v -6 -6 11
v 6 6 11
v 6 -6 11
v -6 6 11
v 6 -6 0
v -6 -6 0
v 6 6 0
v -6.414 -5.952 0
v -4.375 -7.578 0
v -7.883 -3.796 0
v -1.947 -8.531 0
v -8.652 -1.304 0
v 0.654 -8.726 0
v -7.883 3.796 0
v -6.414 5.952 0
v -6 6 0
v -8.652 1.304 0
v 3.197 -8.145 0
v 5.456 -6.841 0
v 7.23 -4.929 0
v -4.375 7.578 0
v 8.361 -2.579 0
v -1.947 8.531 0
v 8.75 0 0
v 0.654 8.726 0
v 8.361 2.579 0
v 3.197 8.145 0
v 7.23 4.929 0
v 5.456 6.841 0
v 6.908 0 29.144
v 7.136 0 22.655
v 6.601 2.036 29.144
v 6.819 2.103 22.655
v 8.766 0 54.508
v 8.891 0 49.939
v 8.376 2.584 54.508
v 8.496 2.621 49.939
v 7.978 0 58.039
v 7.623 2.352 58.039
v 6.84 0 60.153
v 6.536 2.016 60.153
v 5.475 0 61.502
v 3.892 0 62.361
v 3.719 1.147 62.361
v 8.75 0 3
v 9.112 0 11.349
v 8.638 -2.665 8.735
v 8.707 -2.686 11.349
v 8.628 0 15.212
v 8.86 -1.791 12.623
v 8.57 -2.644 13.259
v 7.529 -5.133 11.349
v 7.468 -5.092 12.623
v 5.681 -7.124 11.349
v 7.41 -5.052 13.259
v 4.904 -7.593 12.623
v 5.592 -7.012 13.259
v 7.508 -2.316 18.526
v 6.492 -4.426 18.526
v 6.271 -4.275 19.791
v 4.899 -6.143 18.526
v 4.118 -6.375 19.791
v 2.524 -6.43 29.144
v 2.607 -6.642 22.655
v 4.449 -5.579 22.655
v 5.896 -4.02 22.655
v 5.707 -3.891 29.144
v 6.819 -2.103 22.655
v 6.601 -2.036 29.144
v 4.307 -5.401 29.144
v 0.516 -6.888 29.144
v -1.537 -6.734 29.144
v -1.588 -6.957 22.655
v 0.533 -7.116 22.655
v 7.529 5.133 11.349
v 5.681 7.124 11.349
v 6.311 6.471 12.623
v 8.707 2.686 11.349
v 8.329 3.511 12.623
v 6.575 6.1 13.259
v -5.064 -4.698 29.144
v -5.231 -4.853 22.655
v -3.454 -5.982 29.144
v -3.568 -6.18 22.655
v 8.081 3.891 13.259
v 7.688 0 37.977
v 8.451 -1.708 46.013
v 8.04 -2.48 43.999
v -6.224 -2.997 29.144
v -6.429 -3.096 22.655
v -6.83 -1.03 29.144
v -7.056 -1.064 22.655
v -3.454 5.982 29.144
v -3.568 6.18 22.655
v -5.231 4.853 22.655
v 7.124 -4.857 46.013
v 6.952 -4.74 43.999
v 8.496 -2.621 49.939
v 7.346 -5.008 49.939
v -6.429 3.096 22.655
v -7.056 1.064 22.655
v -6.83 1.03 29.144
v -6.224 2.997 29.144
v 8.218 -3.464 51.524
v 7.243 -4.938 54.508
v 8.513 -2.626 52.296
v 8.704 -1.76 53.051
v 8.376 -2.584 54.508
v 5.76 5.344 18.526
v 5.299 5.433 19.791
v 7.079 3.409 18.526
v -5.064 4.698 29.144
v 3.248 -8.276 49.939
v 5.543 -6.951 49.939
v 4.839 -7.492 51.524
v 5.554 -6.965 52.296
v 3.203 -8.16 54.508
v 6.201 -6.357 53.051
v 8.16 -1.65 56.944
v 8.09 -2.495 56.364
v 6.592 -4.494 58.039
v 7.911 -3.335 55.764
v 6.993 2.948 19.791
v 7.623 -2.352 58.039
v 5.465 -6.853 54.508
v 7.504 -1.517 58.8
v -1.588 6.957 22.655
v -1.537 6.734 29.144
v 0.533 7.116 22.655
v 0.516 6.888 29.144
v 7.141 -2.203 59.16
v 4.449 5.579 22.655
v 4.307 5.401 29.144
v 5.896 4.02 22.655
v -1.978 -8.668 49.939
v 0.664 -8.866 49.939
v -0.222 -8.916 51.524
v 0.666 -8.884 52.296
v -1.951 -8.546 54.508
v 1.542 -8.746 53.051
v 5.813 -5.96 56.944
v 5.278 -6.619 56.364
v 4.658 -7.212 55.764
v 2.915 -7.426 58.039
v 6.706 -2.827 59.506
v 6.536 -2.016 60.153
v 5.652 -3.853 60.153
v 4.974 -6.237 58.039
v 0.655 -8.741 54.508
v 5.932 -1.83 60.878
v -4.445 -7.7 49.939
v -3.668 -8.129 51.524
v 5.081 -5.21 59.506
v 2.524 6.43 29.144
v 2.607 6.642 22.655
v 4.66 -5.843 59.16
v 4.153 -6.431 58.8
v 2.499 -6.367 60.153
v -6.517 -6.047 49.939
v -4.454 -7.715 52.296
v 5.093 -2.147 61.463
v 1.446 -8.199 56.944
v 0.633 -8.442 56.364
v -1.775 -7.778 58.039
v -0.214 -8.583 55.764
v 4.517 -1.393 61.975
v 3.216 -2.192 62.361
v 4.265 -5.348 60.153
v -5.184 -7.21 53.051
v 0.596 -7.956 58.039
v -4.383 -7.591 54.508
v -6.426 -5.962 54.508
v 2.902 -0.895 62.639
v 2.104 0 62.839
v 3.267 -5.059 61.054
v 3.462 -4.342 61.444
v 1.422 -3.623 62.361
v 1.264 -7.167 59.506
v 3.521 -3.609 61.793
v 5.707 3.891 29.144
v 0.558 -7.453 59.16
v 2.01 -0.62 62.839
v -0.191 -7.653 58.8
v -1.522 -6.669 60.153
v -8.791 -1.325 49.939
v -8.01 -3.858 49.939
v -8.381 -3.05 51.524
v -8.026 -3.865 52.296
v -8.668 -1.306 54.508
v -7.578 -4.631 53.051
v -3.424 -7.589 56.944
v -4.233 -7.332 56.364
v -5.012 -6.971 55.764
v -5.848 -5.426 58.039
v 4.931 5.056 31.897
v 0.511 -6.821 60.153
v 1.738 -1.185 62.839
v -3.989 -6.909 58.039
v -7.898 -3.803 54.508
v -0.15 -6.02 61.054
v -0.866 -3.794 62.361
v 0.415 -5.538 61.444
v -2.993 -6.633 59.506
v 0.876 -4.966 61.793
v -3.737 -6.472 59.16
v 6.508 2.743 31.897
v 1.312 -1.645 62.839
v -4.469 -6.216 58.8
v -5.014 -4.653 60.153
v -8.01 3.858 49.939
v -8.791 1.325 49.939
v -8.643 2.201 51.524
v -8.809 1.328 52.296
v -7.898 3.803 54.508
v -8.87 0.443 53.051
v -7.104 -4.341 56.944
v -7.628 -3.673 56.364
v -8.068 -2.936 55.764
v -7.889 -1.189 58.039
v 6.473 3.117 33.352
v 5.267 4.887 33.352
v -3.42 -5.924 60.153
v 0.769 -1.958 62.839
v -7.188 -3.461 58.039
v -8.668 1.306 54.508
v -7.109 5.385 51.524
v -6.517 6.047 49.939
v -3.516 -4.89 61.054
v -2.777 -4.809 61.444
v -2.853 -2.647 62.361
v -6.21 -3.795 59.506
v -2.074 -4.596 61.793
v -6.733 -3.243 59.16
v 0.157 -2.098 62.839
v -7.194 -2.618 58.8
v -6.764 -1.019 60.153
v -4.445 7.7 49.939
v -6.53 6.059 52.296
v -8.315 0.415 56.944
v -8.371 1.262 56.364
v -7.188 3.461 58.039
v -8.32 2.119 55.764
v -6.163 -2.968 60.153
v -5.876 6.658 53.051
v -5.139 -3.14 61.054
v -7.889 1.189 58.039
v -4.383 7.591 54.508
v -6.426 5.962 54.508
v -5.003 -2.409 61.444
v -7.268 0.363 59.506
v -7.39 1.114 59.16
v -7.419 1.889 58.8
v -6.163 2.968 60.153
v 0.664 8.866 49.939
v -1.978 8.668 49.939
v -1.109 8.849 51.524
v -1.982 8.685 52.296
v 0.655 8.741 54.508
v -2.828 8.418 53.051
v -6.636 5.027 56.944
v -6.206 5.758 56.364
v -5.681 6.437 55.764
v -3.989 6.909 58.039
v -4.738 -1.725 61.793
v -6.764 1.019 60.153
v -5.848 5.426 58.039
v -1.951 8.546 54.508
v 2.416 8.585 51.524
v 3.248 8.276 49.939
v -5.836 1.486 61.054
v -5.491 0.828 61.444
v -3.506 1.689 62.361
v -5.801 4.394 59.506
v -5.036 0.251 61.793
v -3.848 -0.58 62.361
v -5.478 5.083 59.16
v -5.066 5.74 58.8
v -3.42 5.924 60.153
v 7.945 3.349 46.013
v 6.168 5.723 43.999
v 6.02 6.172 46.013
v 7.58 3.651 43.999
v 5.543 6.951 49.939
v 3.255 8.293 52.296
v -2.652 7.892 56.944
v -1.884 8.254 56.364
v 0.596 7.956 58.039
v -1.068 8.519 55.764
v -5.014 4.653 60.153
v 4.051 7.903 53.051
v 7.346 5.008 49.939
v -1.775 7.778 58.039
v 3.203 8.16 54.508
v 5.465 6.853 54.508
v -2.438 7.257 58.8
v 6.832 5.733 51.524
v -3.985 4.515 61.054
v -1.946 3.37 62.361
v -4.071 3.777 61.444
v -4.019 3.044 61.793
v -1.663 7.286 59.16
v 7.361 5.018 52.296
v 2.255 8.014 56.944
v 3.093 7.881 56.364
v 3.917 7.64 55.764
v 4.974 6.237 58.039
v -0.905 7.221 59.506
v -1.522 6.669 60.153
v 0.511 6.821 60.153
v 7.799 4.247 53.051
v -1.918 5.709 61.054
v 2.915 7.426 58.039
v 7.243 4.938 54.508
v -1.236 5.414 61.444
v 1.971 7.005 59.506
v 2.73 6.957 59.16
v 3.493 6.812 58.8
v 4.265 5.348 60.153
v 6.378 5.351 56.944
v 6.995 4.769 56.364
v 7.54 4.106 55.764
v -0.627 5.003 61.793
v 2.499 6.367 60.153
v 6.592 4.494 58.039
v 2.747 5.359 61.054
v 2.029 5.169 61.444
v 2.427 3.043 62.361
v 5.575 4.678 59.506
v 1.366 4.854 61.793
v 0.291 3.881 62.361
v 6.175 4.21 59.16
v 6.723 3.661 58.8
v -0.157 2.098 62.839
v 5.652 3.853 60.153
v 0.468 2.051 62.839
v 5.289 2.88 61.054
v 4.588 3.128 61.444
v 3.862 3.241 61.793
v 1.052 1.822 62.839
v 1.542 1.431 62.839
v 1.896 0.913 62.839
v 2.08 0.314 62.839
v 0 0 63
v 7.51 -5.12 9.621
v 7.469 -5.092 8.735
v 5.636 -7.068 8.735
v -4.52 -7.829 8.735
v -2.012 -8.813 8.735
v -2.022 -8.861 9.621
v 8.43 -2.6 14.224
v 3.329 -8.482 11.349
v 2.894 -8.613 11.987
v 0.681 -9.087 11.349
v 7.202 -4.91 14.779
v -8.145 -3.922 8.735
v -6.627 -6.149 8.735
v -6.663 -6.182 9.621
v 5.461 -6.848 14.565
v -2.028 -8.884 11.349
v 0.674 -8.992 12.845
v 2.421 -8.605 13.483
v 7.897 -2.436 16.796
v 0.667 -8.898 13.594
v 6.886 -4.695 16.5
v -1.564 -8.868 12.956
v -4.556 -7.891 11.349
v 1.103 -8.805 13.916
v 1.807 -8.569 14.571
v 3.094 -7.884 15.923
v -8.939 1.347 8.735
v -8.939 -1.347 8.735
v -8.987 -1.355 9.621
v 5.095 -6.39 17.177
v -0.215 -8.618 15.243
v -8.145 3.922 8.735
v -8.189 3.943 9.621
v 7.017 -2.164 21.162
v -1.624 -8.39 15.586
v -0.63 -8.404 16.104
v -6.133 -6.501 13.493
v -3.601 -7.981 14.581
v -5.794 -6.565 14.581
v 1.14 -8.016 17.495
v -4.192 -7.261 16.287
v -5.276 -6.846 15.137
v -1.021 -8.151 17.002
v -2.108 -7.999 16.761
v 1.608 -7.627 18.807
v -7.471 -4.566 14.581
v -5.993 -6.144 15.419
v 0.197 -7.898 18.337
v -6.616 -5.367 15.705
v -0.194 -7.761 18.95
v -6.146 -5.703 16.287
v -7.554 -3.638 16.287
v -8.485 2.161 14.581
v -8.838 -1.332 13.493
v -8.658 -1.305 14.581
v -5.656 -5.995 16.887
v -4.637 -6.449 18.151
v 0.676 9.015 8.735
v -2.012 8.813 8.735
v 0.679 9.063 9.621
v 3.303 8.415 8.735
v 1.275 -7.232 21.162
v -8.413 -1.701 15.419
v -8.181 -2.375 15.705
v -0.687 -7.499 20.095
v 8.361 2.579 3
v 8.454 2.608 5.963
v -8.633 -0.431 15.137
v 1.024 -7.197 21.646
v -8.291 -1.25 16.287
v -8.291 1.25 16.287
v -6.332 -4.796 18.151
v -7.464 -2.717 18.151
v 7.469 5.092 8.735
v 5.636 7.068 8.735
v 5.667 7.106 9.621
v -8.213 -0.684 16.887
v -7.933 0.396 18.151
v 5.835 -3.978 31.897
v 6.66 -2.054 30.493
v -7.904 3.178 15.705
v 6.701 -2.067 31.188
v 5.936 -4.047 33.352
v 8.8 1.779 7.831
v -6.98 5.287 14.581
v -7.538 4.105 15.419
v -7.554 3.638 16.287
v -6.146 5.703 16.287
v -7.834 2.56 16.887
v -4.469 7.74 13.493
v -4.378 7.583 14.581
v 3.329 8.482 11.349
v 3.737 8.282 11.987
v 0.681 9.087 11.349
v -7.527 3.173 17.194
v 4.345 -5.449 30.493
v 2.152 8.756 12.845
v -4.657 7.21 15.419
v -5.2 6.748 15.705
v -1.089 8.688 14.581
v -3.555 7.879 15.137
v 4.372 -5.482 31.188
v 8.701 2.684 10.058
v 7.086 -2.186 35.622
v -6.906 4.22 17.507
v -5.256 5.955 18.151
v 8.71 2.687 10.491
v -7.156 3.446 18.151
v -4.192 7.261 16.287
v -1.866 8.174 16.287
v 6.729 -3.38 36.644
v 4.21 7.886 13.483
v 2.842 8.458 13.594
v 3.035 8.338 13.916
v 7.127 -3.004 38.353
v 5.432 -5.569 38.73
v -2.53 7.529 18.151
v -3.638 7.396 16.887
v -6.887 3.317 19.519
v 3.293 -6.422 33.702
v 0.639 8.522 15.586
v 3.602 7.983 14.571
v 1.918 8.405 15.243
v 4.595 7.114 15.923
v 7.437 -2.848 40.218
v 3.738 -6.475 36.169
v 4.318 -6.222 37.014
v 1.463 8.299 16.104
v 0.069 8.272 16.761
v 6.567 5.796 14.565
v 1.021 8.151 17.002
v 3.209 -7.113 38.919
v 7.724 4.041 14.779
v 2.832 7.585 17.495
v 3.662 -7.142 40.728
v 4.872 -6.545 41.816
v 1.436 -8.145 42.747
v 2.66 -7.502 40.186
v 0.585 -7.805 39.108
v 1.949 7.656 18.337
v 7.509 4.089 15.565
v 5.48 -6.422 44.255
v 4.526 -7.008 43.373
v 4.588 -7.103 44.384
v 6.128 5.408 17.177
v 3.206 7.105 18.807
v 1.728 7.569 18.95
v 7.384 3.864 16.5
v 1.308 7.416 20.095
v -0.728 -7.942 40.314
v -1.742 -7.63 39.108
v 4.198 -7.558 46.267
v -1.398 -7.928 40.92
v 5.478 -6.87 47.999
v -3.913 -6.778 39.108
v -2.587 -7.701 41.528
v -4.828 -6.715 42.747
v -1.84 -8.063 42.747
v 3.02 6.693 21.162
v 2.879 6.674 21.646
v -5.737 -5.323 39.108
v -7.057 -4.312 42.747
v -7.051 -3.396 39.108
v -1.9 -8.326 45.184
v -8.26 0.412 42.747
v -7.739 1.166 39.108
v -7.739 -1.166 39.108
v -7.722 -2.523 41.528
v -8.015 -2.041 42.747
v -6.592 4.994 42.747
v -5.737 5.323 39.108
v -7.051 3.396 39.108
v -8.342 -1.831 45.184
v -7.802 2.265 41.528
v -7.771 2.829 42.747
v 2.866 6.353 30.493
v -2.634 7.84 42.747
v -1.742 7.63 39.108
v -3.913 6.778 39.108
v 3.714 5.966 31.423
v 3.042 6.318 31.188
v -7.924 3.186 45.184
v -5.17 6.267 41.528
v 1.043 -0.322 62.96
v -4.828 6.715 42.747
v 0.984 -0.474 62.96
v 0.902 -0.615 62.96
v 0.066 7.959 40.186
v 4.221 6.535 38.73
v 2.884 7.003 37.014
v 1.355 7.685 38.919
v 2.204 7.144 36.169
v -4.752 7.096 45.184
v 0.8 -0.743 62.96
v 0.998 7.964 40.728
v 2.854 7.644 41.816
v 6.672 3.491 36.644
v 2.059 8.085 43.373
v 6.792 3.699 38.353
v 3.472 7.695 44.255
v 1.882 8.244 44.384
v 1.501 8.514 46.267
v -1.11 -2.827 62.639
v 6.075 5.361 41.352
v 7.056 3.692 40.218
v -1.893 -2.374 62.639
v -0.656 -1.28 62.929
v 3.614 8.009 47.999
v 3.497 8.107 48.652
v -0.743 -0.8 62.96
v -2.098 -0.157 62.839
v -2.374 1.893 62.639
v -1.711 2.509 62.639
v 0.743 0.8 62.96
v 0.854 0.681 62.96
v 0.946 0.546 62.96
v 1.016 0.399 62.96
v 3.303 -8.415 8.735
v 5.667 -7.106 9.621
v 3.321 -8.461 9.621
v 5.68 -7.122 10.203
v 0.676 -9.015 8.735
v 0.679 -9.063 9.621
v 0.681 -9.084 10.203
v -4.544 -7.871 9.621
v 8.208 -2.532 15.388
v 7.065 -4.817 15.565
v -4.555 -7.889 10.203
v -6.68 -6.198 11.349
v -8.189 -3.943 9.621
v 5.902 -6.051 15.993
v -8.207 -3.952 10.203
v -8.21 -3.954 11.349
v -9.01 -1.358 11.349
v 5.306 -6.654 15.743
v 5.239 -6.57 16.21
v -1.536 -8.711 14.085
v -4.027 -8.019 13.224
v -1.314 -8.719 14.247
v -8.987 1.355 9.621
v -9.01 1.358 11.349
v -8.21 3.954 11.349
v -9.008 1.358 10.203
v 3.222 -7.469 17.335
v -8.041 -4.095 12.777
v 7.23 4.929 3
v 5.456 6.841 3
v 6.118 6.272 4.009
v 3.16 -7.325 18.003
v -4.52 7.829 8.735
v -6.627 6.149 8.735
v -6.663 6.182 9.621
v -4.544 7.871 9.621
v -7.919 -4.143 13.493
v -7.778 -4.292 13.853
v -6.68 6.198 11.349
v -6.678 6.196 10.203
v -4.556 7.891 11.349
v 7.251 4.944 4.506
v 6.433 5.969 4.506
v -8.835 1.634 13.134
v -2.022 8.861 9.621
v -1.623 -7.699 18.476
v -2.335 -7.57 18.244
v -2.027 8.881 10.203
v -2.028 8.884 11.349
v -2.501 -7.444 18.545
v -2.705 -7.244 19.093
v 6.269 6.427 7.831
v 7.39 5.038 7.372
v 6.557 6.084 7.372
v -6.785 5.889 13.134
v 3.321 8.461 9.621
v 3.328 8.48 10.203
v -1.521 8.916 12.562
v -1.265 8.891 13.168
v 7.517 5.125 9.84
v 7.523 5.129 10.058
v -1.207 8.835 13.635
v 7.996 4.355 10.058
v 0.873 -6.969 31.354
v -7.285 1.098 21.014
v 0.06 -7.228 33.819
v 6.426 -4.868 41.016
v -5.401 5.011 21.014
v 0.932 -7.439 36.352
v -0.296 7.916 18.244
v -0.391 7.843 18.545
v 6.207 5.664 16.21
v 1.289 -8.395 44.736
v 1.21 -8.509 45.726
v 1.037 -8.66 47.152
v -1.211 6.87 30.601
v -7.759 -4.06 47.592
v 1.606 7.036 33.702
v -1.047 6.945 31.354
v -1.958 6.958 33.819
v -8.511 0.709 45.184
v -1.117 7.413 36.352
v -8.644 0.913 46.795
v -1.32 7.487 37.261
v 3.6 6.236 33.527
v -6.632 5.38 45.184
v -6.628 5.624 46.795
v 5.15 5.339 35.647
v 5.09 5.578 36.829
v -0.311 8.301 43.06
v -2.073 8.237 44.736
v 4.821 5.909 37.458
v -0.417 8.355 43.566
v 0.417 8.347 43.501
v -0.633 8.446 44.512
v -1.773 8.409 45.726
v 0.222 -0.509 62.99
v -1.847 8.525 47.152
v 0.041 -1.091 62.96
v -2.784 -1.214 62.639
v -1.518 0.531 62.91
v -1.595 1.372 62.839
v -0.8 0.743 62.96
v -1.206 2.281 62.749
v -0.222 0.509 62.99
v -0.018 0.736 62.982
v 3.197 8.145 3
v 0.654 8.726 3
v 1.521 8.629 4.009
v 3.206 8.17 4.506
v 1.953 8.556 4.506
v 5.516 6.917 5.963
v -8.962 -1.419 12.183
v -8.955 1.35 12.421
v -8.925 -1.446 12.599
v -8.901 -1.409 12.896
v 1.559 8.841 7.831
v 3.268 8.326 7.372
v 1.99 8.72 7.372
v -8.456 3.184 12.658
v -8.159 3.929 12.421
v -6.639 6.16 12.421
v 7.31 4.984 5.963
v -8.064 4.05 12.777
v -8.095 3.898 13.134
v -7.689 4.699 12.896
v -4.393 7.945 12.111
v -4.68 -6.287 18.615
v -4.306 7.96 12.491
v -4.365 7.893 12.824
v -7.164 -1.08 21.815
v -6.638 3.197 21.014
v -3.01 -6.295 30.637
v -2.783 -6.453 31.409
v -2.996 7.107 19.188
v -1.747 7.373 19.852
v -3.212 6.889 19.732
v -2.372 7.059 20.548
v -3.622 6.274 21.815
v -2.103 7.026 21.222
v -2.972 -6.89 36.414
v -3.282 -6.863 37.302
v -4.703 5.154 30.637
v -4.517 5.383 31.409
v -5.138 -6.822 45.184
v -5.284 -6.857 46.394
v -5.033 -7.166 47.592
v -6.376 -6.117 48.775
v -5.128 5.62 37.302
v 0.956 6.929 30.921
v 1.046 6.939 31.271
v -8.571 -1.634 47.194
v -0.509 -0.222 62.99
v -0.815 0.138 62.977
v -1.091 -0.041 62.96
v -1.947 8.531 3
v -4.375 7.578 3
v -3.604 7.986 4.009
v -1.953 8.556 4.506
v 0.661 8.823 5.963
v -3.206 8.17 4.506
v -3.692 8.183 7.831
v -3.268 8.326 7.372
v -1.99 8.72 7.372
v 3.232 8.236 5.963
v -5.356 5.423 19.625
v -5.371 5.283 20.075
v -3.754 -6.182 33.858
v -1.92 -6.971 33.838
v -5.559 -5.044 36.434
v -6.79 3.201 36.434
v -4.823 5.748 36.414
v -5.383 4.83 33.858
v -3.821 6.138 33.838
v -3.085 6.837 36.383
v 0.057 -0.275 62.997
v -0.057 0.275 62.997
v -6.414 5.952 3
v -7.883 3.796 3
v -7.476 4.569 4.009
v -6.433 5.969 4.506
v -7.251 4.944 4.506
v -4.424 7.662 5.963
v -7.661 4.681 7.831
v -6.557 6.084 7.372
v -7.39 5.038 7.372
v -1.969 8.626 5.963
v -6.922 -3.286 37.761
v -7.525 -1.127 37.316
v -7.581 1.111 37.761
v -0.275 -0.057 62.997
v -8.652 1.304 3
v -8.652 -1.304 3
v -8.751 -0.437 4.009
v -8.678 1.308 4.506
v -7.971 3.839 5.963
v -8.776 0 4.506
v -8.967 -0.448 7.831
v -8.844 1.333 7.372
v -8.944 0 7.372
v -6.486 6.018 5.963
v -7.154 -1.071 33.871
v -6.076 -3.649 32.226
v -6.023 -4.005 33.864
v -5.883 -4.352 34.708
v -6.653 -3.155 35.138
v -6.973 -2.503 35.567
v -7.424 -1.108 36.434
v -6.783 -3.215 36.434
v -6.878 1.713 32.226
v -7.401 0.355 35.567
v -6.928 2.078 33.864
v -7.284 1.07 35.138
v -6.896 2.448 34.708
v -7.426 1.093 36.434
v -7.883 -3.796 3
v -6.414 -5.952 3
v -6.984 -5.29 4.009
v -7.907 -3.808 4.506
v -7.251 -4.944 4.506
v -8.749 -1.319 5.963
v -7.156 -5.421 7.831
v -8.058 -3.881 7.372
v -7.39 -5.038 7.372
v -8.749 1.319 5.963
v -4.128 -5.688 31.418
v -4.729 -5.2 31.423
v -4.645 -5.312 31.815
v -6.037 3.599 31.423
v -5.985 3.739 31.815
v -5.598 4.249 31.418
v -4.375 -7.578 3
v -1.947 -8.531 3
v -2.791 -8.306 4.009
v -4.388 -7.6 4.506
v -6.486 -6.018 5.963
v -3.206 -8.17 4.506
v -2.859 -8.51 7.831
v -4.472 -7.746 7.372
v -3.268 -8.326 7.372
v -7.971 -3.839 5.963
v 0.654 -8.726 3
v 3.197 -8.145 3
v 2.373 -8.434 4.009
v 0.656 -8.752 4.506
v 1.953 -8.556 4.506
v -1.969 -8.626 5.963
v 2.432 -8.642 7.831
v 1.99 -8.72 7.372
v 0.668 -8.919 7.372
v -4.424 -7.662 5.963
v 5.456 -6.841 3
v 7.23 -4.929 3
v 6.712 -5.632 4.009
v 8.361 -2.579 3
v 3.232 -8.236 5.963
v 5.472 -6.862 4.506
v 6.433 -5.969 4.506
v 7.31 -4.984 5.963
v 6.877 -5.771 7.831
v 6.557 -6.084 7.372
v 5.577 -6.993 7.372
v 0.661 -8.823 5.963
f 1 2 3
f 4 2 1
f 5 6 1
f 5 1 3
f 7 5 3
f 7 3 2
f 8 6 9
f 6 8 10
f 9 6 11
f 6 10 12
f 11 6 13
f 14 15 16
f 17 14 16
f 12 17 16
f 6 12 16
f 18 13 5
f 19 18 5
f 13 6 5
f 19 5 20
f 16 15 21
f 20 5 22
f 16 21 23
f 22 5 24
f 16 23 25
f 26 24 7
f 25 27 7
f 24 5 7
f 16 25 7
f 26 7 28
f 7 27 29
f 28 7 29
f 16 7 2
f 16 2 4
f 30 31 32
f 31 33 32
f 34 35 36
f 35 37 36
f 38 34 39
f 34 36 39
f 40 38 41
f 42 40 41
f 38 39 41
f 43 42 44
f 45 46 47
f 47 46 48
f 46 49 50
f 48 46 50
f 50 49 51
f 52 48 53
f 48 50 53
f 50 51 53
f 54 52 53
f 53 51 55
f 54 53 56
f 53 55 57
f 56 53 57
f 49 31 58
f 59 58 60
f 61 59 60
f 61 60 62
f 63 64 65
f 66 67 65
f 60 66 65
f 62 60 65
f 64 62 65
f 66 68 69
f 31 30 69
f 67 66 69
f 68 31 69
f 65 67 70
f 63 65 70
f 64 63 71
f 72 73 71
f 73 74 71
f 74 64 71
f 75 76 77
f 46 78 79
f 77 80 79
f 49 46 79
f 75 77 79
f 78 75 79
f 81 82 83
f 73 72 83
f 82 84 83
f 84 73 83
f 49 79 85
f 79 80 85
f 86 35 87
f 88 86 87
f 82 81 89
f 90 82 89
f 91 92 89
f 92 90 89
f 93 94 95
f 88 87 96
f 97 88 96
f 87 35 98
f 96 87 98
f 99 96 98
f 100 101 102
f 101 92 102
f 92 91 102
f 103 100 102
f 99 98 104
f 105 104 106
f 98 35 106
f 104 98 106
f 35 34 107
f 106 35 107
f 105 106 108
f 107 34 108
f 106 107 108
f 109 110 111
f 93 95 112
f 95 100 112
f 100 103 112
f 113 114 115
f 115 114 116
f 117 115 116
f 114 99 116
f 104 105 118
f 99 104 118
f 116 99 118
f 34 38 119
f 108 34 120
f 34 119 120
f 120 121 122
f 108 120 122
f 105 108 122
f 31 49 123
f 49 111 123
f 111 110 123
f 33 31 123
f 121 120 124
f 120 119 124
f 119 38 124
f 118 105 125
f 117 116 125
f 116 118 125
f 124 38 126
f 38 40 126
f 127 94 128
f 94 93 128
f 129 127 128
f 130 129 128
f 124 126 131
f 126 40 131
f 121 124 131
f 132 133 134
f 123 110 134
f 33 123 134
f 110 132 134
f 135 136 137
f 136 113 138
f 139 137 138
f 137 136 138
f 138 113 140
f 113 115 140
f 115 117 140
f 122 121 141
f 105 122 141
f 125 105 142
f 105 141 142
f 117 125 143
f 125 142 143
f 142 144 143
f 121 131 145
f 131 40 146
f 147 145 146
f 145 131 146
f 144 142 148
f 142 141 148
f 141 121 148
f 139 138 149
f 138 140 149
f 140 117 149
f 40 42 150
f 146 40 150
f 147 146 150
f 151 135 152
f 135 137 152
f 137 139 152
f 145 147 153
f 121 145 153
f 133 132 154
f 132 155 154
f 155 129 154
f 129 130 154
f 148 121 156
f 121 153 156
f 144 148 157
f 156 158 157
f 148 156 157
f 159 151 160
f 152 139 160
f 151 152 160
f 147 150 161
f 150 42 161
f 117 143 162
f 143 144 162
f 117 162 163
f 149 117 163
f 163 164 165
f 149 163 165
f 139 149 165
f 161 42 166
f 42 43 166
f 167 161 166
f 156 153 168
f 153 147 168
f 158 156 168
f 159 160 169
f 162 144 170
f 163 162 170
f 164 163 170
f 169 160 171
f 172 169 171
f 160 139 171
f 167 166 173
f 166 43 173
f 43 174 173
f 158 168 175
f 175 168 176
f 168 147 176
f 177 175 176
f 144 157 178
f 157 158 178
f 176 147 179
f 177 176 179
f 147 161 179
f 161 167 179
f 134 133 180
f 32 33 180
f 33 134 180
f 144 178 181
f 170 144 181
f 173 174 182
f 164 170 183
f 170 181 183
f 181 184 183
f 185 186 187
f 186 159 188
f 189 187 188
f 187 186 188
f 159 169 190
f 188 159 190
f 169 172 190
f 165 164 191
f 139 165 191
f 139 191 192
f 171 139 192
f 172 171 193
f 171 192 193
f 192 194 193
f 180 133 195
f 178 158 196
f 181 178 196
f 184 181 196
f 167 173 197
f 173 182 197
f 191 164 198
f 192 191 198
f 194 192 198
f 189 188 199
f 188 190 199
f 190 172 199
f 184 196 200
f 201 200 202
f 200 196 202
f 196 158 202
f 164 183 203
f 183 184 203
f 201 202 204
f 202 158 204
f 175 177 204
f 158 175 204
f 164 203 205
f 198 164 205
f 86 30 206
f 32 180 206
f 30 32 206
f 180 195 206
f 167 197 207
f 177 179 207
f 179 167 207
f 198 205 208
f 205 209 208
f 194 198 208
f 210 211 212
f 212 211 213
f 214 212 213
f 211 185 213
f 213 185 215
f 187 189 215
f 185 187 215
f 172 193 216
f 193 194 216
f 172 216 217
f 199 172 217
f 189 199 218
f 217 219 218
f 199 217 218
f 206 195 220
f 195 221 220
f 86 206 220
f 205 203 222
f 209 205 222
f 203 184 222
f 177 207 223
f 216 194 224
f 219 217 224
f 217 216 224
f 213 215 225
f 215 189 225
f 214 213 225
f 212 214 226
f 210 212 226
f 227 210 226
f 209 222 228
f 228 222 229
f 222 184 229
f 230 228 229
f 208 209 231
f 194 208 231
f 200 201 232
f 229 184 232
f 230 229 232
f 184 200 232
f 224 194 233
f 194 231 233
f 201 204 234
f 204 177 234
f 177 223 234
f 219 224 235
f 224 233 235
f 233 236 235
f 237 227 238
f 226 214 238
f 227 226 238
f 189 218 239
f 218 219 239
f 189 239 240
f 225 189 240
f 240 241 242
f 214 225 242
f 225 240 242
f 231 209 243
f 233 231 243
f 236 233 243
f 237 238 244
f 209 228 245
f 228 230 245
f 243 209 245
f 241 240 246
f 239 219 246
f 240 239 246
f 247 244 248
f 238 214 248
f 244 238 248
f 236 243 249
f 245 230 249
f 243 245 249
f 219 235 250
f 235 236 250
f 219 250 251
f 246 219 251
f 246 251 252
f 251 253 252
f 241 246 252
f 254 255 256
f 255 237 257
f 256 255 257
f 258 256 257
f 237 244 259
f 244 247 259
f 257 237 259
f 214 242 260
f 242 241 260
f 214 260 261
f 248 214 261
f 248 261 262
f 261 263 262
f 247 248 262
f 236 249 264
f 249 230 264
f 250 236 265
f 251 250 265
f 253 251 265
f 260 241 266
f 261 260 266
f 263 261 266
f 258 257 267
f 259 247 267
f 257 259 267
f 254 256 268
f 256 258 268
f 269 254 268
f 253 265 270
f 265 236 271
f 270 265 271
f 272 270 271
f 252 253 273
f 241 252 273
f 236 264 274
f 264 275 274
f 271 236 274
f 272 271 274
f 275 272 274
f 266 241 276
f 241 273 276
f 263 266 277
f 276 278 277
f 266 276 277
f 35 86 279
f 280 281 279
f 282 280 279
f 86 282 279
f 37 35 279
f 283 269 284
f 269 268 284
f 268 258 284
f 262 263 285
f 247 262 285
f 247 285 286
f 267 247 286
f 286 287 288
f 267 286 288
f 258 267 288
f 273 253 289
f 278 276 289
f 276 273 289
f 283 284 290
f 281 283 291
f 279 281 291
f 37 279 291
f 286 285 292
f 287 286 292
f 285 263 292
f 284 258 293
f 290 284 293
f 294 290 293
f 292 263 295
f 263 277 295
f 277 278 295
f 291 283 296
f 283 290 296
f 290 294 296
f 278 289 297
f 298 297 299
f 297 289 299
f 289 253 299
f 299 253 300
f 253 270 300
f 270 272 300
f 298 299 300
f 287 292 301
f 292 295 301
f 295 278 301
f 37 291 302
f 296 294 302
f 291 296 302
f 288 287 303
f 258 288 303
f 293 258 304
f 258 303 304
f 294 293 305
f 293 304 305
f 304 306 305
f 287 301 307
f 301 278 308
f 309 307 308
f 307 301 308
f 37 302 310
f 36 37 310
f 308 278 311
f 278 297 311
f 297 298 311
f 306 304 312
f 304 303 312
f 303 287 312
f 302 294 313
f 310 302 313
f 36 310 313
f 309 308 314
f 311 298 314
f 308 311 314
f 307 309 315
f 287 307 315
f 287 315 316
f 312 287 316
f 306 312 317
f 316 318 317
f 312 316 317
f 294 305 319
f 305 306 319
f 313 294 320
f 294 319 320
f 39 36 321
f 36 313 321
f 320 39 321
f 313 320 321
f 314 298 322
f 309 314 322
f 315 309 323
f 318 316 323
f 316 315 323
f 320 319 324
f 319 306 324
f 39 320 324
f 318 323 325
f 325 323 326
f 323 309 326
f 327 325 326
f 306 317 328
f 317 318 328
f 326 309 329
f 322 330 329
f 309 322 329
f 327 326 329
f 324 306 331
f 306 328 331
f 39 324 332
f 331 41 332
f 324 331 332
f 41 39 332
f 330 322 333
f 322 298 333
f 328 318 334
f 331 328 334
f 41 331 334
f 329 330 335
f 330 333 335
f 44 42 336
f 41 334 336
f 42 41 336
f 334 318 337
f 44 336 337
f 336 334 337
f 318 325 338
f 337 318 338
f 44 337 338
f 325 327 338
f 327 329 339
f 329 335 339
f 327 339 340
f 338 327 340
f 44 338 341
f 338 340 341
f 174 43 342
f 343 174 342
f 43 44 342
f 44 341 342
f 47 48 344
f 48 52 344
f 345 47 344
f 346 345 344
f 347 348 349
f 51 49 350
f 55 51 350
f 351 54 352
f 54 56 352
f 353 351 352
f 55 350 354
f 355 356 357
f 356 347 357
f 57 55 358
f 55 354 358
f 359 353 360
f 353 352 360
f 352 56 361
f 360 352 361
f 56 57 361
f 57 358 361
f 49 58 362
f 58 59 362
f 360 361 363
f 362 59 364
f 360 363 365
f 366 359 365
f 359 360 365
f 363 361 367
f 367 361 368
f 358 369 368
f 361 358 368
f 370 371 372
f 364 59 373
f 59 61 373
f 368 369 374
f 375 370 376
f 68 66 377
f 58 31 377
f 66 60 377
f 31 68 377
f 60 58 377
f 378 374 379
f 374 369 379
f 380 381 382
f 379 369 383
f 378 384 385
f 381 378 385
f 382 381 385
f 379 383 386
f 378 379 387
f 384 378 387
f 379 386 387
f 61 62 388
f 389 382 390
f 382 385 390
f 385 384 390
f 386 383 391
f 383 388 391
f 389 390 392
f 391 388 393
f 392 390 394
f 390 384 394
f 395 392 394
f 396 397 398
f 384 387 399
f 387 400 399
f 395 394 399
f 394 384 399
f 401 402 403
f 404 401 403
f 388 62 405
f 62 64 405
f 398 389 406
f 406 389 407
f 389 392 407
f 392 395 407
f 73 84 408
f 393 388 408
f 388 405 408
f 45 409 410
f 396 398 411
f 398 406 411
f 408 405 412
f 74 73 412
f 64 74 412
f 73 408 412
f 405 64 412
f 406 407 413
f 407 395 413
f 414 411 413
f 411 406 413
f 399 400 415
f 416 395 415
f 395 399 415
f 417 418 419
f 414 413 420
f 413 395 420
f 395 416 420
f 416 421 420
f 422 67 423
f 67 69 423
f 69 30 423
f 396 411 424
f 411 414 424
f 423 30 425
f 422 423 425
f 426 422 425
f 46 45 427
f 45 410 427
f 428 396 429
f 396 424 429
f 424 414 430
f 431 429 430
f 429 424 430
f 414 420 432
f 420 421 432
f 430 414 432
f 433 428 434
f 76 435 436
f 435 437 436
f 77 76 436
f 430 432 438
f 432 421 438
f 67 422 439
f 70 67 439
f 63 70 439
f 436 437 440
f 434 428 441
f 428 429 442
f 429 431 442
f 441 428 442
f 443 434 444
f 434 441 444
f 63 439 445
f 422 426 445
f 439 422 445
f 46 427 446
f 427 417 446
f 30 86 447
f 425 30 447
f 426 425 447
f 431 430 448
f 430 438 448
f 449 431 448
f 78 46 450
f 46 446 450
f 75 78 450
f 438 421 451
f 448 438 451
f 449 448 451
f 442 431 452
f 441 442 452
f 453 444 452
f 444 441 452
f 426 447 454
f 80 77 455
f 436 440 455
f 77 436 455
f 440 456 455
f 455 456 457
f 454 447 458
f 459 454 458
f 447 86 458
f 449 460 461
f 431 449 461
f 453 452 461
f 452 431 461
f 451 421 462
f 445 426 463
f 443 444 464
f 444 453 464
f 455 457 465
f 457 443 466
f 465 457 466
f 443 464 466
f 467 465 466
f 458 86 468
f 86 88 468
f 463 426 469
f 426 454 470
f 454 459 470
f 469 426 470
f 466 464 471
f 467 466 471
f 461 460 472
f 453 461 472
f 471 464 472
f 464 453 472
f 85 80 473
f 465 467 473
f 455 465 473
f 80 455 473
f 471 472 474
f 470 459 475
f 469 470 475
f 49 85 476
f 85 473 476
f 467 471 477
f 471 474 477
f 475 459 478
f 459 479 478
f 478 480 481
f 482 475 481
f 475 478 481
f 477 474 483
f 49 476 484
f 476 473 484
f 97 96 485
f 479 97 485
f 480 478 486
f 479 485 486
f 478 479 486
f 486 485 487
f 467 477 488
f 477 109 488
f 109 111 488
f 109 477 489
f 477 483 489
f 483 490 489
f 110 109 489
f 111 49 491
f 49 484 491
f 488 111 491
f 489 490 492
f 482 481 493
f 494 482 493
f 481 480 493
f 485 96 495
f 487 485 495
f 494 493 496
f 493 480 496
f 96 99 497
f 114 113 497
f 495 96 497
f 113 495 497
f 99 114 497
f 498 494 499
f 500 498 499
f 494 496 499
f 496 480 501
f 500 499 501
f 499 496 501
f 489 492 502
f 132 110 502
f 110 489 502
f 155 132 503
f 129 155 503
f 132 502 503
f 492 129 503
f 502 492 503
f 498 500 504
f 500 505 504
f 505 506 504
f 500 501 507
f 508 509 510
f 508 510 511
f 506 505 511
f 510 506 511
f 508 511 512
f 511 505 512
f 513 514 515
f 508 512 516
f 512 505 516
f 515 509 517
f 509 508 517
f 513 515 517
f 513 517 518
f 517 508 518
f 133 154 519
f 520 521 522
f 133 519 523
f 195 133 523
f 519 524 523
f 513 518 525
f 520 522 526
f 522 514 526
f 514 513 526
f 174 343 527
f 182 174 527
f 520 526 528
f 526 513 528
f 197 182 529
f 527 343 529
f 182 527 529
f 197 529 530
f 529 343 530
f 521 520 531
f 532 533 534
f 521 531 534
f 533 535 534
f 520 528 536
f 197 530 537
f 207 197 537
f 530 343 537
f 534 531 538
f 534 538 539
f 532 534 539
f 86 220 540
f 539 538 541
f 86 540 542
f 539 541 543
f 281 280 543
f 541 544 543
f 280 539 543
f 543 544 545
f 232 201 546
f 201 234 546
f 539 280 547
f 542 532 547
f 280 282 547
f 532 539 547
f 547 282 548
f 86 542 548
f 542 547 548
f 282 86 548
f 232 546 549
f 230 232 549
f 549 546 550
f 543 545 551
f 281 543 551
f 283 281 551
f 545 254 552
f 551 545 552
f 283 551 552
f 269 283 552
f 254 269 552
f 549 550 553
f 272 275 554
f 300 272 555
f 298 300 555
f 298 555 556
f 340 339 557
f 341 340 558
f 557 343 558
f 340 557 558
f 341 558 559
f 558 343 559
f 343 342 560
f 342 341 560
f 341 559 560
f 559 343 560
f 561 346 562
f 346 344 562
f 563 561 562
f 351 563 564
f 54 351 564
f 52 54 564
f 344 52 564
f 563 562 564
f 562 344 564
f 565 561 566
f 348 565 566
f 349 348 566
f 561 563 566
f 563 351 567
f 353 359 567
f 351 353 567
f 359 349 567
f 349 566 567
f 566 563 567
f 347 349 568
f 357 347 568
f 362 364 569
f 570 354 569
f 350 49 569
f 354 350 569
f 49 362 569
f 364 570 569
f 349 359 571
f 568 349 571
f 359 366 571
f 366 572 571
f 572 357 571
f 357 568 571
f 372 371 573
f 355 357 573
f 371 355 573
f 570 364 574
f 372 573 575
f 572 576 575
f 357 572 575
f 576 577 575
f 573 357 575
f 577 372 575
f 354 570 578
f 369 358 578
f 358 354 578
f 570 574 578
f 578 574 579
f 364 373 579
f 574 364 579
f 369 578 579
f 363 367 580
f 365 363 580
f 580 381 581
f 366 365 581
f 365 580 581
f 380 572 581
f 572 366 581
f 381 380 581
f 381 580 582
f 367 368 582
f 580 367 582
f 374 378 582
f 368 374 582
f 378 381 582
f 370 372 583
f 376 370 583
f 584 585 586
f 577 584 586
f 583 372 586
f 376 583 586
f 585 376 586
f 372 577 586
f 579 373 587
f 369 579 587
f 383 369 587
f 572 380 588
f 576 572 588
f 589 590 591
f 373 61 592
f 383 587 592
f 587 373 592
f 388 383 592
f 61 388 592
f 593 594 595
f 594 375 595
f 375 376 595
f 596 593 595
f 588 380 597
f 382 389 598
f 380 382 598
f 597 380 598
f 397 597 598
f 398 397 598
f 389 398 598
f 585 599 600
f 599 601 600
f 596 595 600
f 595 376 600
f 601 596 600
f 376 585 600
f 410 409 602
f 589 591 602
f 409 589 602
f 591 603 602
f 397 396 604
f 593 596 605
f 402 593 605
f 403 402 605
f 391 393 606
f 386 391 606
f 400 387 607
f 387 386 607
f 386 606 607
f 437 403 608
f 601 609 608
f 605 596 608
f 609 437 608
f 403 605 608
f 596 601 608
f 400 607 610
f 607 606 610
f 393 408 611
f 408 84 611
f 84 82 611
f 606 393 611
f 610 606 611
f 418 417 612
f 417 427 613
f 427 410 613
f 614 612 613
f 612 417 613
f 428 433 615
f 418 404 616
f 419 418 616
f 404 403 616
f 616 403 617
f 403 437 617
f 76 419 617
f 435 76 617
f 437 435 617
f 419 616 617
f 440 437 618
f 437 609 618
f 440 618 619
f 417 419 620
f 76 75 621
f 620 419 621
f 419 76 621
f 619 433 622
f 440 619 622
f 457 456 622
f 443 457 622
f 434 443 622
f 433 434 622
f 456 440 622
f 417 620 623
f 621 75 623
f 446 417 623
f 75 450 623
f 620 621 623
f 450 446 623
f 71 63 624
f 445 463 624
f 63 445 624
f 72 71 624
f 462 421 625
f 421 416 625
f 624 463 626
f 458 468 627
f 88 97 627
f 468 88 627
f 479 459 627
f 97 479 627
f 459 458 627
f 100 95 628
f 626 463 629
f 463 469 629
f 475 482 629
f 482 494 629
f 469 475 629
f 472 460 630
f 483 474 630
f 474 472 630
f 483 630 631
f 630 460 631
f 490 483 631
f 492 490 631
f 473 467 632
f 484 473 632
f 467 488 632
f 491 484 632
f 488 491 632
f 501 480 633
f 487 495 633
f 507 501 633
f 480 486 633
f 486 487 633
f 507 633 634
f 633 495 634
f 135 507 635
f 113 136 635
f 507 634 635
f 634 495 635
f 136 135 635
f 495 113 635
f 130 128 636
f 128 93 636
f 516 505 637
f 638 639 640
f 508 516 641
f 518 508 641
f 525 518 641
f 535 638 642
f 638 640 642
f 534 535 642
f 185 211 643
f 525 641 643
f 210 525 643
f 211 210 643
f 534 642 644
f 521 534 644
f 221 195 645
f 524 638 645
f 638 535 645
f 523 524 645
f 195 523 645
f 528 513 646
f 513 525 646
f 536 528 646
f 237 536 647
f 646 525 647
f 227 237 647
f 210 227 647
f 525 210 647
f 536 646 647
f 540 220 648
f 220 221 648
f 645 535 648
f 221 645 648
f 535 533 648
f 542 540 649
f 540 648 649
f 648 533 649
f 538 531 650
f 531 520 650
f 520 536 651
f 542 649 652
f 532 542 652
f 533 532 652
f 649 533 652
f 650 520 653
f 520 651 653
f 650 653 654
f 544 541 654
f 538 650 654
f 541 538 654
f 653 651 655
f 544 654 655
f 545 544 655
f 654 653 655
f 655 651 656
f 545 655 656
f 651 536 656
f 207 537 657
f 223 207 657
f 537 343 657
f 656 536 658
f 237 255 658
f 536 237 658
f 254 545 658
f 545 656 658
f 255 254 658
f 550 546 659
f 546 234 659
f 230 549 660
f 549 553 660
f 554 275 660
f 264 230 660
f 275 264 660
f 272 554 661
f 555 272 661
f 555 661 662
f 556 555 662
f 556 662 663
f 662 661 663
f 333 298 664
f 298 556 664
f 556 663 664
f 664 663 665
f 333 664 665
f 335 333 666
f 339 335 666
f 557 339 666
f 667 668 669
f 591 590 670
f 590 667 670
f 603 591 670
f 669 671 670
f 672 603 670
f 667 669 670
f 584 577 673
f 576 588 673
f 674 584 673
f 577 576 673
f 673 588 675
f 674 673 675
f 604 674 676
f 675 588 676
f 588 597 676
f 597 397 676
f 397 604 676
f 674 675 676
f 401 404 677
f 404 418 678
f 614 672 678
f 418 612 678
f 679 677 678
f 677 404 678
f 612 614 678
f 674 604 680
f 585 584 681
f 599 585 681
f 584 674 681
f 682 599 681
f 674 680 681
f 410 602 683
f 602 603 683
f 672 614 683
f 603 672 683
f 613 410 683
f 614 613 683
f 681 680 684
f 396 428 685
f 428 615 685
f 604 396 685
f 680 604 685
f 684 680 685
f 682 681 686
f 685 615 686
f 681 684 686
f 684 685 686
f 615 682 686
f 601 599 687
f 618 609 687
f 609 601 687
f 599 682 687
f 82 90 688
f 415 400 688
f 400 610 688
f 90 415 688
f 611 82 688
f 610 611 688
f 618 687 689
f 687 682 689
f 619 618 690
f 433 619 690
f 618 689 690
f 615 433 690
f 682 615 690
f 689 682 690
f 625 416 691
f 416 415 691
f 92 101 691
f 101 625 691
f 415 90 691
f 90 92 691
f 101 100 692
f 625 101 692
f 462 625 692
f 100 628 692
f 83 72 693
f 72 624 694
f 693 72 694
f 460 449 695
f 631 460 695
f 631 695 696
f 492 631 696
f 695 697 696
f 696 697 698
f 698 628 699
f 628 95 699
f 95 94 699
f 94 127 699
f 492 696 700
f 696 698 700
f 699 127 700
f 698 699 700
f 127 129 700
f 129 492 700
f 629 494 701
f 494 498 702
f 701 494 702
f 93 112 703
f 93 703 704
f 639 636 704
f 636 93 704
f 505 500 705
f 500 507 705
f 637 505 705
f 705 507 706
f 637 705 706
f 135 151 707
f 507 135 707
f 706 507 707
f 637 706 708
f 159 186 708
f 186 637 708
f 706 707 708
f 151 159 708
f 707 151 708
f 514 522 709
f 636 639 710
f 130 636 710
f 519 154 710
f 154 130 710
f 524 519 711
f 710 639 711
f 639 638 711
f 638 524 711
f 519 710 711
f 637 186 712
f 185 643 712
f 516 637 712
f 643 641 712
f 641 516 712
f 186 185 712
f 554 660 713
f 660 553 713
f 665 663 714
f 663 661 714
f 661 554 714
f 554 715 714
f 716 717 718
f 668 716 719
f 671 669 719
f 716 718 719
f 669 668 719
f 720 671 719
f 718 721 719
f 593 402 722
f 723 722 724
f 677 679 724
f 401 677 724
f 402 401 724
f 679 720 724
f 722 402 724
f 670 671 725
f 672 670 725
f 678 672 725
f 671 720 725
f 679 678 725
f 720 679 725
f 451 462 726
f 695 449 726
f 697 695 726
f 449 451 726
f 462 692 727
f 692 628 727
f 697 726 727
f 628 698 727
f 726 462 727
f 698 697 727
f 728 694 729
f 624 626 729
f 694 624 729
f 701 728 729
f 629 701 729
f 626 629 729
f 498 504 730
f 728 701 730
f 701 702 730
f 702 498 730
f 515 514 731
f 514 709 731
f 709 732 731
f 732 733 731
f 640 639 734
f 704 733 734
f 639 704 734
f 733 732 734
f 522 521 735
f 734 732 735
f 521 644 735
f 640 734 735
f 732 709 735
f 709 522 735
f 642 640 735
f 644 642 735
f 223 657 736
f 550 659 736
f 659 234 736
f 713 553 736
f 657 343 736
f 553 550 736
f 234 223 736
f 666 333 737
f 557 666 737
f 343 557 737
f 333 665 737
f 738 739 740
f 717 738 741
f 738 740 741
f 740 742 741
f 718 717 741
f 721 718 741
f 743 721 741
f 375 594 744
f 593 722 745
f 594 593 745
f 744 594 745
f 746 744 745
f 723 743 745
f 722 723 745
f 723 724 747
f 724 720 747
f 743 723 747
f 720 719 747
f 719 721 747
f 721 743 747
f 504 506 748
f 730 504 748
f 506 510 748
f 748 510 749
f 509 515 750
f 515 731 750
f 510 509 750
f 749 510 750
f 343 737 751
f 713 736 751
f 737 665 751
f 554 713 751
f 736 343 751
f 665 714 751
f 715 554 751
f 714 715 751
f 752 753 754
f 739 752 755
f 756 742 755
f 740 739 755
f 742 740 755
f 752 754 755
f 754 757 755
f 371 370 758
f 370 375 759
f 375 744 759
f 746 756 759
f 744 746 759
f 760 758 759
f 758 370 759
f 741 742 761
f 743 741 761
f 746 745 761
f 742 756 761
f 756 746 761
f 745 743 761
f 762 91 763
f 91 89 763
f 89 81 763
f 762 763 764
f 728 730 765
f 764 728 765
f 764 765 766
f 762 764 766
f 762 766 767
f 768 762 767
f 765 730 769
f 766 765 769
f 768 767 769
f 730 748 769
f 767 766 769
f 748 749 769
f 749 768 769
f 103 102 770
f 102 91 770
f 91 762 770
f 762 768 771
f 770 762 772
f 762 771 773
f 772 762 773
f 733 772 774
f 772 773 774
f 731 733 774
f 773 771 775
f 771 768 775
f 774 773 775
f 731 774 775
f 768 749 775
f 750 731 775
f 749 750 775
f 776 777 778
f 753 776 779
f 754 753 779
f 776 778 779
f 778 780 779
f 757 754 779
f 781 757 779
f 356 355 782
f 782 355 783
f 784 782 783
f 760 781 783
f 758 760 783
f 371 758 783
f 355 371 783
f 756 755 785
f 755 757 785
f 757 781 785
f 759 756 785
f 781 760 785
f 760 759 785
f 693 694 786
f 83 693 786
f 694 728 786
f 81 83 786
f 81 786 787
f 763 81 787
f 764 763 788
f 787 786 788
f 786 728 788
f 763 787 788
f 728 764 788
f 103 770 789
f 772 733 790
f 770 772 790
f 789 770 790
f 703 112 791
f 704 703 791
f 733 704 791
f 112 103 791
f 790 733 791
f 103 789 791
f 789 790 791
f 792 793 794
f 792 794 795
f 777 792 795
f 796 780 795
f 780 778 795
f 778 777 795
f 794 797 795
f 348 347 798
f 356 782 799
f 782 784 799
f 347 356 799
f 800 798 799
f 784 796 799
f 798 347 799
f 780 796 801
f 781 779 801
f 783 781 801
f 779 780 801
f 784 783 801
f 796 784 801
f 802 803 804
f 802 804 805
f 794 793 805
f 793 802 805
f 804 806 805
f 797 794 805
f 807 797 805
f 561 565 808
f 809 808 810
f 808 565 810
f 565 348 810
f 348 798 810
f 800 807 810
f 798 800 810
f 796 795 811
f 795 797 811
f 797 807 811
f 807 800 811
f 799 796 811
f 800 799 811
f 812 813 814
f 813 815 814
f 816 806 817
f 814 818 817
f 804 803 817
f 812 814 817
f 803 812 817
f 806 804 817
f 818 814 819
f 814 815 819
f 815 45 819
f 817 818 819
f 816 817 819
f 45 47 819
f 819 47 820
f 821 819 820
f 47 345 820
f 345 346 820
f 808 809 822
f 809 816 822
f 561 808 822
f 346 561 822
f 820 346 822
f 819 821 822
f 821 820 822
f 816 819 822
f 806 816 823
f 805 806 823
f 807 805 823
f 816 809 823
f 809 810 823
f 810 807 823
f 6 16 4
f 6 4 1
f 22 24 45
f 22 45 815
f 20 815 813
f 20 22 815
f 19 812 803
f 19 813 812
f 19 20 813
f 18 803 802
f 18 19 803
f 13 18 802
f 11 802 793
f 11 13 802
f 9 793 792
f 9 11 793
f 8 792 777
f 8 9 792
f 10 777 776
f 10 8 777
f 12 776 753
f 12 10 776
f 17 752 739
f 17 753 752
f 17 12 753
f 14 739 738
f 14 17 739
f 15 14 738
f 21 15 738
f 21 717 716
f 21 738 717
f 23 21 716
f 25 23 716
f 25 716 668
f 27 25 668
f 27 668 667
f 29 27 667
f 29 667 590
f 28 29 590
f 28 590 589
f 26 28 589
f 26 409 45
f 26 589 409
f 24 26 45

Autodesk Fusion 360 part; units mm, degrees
sketch "Skizze1" plane through (0, 0, 0) normal (0, 0, 1) x (1, 0, 0)
  circle A0 centre (0, 0) radius 8.75
  dimension "d1" = 17.5
extrude "Extrusion1" add sketch "Skizze1" along normal blind 3
sketch "Skizze2" plane through (0, 0, 0) normal (0, 1, 0) x (1, 0, 0)
  line L0 (-8.75, -3) -> (8.75, -3)
  spline S0 degree 5 poles (8.75, -3) (8.75, -3.6089) (8.7713, -4.8074) (8.867, -6.548) (9.0688, -8.7515) (9.1987, -11.3323) (8.979, -13.822) (8.3719, -16.4163) (7.5918, -19.4247) (6.9488, -23.165) (6.7363, -27.8736) (7.1146, -33.6192) (7.9586, -40.1758) (8.8414, -47.0213) (9.1742, -53.4801) (8.2995, -58.8206) (6.142, -61.6598) (3.4944, -62.7563) (1.2455, -63) (0, -63) knots 0 0 0 0 0 0 0.066667 0.133333 0.2 0.266667 0.333333 0.4 0.466667 0.533333 0.6 0.666667 0.733333 0.8 0.866667 0.933333 1 1 1 1 1 1
  line L1 (0, -63) -> (0, -3)
  line L2 (3.5, -63) -> (-3.5, -63)
  line L3 (8.75, 1.4189) -> (8.75, -7.4189)
  point P0 (9, -13)
  point P1 (7, -31)
  dimension "d4" = 60
  dimension "d5" = 7
  dimension "d6" = 9
  dimension "d7" = 7
  dimension "d8" = 10
  dimension "d9" = 28
revolve "Drehen1" add sketch "Skizze2" angle 360 about axis through (0, 0, 63) along (0, 0, -1)
sketch "Skizze3" plane through (0, 0, 0) normal (0, 0, -1) x (-1, 0, 0)
  circle A0 centre (0, 0) radius 8.75
  line L0 (-6, 6) -> (6, 6)
  line L1 (6, 6) -> (6, -6)
  line L2 (6, -6) -> (-6, -6)
  line L3 (-6, -6) -> (-6, 6)
  line L4 (-6, 6) -> (6, -6) construction
  line L5 (6, 6) -> (-6, -6) construction
  dimension "d11" = 12
extrude "Extrusion2" cut sketch "Skizze3" against normal blind 11 contours L0 L1 L2 L3
